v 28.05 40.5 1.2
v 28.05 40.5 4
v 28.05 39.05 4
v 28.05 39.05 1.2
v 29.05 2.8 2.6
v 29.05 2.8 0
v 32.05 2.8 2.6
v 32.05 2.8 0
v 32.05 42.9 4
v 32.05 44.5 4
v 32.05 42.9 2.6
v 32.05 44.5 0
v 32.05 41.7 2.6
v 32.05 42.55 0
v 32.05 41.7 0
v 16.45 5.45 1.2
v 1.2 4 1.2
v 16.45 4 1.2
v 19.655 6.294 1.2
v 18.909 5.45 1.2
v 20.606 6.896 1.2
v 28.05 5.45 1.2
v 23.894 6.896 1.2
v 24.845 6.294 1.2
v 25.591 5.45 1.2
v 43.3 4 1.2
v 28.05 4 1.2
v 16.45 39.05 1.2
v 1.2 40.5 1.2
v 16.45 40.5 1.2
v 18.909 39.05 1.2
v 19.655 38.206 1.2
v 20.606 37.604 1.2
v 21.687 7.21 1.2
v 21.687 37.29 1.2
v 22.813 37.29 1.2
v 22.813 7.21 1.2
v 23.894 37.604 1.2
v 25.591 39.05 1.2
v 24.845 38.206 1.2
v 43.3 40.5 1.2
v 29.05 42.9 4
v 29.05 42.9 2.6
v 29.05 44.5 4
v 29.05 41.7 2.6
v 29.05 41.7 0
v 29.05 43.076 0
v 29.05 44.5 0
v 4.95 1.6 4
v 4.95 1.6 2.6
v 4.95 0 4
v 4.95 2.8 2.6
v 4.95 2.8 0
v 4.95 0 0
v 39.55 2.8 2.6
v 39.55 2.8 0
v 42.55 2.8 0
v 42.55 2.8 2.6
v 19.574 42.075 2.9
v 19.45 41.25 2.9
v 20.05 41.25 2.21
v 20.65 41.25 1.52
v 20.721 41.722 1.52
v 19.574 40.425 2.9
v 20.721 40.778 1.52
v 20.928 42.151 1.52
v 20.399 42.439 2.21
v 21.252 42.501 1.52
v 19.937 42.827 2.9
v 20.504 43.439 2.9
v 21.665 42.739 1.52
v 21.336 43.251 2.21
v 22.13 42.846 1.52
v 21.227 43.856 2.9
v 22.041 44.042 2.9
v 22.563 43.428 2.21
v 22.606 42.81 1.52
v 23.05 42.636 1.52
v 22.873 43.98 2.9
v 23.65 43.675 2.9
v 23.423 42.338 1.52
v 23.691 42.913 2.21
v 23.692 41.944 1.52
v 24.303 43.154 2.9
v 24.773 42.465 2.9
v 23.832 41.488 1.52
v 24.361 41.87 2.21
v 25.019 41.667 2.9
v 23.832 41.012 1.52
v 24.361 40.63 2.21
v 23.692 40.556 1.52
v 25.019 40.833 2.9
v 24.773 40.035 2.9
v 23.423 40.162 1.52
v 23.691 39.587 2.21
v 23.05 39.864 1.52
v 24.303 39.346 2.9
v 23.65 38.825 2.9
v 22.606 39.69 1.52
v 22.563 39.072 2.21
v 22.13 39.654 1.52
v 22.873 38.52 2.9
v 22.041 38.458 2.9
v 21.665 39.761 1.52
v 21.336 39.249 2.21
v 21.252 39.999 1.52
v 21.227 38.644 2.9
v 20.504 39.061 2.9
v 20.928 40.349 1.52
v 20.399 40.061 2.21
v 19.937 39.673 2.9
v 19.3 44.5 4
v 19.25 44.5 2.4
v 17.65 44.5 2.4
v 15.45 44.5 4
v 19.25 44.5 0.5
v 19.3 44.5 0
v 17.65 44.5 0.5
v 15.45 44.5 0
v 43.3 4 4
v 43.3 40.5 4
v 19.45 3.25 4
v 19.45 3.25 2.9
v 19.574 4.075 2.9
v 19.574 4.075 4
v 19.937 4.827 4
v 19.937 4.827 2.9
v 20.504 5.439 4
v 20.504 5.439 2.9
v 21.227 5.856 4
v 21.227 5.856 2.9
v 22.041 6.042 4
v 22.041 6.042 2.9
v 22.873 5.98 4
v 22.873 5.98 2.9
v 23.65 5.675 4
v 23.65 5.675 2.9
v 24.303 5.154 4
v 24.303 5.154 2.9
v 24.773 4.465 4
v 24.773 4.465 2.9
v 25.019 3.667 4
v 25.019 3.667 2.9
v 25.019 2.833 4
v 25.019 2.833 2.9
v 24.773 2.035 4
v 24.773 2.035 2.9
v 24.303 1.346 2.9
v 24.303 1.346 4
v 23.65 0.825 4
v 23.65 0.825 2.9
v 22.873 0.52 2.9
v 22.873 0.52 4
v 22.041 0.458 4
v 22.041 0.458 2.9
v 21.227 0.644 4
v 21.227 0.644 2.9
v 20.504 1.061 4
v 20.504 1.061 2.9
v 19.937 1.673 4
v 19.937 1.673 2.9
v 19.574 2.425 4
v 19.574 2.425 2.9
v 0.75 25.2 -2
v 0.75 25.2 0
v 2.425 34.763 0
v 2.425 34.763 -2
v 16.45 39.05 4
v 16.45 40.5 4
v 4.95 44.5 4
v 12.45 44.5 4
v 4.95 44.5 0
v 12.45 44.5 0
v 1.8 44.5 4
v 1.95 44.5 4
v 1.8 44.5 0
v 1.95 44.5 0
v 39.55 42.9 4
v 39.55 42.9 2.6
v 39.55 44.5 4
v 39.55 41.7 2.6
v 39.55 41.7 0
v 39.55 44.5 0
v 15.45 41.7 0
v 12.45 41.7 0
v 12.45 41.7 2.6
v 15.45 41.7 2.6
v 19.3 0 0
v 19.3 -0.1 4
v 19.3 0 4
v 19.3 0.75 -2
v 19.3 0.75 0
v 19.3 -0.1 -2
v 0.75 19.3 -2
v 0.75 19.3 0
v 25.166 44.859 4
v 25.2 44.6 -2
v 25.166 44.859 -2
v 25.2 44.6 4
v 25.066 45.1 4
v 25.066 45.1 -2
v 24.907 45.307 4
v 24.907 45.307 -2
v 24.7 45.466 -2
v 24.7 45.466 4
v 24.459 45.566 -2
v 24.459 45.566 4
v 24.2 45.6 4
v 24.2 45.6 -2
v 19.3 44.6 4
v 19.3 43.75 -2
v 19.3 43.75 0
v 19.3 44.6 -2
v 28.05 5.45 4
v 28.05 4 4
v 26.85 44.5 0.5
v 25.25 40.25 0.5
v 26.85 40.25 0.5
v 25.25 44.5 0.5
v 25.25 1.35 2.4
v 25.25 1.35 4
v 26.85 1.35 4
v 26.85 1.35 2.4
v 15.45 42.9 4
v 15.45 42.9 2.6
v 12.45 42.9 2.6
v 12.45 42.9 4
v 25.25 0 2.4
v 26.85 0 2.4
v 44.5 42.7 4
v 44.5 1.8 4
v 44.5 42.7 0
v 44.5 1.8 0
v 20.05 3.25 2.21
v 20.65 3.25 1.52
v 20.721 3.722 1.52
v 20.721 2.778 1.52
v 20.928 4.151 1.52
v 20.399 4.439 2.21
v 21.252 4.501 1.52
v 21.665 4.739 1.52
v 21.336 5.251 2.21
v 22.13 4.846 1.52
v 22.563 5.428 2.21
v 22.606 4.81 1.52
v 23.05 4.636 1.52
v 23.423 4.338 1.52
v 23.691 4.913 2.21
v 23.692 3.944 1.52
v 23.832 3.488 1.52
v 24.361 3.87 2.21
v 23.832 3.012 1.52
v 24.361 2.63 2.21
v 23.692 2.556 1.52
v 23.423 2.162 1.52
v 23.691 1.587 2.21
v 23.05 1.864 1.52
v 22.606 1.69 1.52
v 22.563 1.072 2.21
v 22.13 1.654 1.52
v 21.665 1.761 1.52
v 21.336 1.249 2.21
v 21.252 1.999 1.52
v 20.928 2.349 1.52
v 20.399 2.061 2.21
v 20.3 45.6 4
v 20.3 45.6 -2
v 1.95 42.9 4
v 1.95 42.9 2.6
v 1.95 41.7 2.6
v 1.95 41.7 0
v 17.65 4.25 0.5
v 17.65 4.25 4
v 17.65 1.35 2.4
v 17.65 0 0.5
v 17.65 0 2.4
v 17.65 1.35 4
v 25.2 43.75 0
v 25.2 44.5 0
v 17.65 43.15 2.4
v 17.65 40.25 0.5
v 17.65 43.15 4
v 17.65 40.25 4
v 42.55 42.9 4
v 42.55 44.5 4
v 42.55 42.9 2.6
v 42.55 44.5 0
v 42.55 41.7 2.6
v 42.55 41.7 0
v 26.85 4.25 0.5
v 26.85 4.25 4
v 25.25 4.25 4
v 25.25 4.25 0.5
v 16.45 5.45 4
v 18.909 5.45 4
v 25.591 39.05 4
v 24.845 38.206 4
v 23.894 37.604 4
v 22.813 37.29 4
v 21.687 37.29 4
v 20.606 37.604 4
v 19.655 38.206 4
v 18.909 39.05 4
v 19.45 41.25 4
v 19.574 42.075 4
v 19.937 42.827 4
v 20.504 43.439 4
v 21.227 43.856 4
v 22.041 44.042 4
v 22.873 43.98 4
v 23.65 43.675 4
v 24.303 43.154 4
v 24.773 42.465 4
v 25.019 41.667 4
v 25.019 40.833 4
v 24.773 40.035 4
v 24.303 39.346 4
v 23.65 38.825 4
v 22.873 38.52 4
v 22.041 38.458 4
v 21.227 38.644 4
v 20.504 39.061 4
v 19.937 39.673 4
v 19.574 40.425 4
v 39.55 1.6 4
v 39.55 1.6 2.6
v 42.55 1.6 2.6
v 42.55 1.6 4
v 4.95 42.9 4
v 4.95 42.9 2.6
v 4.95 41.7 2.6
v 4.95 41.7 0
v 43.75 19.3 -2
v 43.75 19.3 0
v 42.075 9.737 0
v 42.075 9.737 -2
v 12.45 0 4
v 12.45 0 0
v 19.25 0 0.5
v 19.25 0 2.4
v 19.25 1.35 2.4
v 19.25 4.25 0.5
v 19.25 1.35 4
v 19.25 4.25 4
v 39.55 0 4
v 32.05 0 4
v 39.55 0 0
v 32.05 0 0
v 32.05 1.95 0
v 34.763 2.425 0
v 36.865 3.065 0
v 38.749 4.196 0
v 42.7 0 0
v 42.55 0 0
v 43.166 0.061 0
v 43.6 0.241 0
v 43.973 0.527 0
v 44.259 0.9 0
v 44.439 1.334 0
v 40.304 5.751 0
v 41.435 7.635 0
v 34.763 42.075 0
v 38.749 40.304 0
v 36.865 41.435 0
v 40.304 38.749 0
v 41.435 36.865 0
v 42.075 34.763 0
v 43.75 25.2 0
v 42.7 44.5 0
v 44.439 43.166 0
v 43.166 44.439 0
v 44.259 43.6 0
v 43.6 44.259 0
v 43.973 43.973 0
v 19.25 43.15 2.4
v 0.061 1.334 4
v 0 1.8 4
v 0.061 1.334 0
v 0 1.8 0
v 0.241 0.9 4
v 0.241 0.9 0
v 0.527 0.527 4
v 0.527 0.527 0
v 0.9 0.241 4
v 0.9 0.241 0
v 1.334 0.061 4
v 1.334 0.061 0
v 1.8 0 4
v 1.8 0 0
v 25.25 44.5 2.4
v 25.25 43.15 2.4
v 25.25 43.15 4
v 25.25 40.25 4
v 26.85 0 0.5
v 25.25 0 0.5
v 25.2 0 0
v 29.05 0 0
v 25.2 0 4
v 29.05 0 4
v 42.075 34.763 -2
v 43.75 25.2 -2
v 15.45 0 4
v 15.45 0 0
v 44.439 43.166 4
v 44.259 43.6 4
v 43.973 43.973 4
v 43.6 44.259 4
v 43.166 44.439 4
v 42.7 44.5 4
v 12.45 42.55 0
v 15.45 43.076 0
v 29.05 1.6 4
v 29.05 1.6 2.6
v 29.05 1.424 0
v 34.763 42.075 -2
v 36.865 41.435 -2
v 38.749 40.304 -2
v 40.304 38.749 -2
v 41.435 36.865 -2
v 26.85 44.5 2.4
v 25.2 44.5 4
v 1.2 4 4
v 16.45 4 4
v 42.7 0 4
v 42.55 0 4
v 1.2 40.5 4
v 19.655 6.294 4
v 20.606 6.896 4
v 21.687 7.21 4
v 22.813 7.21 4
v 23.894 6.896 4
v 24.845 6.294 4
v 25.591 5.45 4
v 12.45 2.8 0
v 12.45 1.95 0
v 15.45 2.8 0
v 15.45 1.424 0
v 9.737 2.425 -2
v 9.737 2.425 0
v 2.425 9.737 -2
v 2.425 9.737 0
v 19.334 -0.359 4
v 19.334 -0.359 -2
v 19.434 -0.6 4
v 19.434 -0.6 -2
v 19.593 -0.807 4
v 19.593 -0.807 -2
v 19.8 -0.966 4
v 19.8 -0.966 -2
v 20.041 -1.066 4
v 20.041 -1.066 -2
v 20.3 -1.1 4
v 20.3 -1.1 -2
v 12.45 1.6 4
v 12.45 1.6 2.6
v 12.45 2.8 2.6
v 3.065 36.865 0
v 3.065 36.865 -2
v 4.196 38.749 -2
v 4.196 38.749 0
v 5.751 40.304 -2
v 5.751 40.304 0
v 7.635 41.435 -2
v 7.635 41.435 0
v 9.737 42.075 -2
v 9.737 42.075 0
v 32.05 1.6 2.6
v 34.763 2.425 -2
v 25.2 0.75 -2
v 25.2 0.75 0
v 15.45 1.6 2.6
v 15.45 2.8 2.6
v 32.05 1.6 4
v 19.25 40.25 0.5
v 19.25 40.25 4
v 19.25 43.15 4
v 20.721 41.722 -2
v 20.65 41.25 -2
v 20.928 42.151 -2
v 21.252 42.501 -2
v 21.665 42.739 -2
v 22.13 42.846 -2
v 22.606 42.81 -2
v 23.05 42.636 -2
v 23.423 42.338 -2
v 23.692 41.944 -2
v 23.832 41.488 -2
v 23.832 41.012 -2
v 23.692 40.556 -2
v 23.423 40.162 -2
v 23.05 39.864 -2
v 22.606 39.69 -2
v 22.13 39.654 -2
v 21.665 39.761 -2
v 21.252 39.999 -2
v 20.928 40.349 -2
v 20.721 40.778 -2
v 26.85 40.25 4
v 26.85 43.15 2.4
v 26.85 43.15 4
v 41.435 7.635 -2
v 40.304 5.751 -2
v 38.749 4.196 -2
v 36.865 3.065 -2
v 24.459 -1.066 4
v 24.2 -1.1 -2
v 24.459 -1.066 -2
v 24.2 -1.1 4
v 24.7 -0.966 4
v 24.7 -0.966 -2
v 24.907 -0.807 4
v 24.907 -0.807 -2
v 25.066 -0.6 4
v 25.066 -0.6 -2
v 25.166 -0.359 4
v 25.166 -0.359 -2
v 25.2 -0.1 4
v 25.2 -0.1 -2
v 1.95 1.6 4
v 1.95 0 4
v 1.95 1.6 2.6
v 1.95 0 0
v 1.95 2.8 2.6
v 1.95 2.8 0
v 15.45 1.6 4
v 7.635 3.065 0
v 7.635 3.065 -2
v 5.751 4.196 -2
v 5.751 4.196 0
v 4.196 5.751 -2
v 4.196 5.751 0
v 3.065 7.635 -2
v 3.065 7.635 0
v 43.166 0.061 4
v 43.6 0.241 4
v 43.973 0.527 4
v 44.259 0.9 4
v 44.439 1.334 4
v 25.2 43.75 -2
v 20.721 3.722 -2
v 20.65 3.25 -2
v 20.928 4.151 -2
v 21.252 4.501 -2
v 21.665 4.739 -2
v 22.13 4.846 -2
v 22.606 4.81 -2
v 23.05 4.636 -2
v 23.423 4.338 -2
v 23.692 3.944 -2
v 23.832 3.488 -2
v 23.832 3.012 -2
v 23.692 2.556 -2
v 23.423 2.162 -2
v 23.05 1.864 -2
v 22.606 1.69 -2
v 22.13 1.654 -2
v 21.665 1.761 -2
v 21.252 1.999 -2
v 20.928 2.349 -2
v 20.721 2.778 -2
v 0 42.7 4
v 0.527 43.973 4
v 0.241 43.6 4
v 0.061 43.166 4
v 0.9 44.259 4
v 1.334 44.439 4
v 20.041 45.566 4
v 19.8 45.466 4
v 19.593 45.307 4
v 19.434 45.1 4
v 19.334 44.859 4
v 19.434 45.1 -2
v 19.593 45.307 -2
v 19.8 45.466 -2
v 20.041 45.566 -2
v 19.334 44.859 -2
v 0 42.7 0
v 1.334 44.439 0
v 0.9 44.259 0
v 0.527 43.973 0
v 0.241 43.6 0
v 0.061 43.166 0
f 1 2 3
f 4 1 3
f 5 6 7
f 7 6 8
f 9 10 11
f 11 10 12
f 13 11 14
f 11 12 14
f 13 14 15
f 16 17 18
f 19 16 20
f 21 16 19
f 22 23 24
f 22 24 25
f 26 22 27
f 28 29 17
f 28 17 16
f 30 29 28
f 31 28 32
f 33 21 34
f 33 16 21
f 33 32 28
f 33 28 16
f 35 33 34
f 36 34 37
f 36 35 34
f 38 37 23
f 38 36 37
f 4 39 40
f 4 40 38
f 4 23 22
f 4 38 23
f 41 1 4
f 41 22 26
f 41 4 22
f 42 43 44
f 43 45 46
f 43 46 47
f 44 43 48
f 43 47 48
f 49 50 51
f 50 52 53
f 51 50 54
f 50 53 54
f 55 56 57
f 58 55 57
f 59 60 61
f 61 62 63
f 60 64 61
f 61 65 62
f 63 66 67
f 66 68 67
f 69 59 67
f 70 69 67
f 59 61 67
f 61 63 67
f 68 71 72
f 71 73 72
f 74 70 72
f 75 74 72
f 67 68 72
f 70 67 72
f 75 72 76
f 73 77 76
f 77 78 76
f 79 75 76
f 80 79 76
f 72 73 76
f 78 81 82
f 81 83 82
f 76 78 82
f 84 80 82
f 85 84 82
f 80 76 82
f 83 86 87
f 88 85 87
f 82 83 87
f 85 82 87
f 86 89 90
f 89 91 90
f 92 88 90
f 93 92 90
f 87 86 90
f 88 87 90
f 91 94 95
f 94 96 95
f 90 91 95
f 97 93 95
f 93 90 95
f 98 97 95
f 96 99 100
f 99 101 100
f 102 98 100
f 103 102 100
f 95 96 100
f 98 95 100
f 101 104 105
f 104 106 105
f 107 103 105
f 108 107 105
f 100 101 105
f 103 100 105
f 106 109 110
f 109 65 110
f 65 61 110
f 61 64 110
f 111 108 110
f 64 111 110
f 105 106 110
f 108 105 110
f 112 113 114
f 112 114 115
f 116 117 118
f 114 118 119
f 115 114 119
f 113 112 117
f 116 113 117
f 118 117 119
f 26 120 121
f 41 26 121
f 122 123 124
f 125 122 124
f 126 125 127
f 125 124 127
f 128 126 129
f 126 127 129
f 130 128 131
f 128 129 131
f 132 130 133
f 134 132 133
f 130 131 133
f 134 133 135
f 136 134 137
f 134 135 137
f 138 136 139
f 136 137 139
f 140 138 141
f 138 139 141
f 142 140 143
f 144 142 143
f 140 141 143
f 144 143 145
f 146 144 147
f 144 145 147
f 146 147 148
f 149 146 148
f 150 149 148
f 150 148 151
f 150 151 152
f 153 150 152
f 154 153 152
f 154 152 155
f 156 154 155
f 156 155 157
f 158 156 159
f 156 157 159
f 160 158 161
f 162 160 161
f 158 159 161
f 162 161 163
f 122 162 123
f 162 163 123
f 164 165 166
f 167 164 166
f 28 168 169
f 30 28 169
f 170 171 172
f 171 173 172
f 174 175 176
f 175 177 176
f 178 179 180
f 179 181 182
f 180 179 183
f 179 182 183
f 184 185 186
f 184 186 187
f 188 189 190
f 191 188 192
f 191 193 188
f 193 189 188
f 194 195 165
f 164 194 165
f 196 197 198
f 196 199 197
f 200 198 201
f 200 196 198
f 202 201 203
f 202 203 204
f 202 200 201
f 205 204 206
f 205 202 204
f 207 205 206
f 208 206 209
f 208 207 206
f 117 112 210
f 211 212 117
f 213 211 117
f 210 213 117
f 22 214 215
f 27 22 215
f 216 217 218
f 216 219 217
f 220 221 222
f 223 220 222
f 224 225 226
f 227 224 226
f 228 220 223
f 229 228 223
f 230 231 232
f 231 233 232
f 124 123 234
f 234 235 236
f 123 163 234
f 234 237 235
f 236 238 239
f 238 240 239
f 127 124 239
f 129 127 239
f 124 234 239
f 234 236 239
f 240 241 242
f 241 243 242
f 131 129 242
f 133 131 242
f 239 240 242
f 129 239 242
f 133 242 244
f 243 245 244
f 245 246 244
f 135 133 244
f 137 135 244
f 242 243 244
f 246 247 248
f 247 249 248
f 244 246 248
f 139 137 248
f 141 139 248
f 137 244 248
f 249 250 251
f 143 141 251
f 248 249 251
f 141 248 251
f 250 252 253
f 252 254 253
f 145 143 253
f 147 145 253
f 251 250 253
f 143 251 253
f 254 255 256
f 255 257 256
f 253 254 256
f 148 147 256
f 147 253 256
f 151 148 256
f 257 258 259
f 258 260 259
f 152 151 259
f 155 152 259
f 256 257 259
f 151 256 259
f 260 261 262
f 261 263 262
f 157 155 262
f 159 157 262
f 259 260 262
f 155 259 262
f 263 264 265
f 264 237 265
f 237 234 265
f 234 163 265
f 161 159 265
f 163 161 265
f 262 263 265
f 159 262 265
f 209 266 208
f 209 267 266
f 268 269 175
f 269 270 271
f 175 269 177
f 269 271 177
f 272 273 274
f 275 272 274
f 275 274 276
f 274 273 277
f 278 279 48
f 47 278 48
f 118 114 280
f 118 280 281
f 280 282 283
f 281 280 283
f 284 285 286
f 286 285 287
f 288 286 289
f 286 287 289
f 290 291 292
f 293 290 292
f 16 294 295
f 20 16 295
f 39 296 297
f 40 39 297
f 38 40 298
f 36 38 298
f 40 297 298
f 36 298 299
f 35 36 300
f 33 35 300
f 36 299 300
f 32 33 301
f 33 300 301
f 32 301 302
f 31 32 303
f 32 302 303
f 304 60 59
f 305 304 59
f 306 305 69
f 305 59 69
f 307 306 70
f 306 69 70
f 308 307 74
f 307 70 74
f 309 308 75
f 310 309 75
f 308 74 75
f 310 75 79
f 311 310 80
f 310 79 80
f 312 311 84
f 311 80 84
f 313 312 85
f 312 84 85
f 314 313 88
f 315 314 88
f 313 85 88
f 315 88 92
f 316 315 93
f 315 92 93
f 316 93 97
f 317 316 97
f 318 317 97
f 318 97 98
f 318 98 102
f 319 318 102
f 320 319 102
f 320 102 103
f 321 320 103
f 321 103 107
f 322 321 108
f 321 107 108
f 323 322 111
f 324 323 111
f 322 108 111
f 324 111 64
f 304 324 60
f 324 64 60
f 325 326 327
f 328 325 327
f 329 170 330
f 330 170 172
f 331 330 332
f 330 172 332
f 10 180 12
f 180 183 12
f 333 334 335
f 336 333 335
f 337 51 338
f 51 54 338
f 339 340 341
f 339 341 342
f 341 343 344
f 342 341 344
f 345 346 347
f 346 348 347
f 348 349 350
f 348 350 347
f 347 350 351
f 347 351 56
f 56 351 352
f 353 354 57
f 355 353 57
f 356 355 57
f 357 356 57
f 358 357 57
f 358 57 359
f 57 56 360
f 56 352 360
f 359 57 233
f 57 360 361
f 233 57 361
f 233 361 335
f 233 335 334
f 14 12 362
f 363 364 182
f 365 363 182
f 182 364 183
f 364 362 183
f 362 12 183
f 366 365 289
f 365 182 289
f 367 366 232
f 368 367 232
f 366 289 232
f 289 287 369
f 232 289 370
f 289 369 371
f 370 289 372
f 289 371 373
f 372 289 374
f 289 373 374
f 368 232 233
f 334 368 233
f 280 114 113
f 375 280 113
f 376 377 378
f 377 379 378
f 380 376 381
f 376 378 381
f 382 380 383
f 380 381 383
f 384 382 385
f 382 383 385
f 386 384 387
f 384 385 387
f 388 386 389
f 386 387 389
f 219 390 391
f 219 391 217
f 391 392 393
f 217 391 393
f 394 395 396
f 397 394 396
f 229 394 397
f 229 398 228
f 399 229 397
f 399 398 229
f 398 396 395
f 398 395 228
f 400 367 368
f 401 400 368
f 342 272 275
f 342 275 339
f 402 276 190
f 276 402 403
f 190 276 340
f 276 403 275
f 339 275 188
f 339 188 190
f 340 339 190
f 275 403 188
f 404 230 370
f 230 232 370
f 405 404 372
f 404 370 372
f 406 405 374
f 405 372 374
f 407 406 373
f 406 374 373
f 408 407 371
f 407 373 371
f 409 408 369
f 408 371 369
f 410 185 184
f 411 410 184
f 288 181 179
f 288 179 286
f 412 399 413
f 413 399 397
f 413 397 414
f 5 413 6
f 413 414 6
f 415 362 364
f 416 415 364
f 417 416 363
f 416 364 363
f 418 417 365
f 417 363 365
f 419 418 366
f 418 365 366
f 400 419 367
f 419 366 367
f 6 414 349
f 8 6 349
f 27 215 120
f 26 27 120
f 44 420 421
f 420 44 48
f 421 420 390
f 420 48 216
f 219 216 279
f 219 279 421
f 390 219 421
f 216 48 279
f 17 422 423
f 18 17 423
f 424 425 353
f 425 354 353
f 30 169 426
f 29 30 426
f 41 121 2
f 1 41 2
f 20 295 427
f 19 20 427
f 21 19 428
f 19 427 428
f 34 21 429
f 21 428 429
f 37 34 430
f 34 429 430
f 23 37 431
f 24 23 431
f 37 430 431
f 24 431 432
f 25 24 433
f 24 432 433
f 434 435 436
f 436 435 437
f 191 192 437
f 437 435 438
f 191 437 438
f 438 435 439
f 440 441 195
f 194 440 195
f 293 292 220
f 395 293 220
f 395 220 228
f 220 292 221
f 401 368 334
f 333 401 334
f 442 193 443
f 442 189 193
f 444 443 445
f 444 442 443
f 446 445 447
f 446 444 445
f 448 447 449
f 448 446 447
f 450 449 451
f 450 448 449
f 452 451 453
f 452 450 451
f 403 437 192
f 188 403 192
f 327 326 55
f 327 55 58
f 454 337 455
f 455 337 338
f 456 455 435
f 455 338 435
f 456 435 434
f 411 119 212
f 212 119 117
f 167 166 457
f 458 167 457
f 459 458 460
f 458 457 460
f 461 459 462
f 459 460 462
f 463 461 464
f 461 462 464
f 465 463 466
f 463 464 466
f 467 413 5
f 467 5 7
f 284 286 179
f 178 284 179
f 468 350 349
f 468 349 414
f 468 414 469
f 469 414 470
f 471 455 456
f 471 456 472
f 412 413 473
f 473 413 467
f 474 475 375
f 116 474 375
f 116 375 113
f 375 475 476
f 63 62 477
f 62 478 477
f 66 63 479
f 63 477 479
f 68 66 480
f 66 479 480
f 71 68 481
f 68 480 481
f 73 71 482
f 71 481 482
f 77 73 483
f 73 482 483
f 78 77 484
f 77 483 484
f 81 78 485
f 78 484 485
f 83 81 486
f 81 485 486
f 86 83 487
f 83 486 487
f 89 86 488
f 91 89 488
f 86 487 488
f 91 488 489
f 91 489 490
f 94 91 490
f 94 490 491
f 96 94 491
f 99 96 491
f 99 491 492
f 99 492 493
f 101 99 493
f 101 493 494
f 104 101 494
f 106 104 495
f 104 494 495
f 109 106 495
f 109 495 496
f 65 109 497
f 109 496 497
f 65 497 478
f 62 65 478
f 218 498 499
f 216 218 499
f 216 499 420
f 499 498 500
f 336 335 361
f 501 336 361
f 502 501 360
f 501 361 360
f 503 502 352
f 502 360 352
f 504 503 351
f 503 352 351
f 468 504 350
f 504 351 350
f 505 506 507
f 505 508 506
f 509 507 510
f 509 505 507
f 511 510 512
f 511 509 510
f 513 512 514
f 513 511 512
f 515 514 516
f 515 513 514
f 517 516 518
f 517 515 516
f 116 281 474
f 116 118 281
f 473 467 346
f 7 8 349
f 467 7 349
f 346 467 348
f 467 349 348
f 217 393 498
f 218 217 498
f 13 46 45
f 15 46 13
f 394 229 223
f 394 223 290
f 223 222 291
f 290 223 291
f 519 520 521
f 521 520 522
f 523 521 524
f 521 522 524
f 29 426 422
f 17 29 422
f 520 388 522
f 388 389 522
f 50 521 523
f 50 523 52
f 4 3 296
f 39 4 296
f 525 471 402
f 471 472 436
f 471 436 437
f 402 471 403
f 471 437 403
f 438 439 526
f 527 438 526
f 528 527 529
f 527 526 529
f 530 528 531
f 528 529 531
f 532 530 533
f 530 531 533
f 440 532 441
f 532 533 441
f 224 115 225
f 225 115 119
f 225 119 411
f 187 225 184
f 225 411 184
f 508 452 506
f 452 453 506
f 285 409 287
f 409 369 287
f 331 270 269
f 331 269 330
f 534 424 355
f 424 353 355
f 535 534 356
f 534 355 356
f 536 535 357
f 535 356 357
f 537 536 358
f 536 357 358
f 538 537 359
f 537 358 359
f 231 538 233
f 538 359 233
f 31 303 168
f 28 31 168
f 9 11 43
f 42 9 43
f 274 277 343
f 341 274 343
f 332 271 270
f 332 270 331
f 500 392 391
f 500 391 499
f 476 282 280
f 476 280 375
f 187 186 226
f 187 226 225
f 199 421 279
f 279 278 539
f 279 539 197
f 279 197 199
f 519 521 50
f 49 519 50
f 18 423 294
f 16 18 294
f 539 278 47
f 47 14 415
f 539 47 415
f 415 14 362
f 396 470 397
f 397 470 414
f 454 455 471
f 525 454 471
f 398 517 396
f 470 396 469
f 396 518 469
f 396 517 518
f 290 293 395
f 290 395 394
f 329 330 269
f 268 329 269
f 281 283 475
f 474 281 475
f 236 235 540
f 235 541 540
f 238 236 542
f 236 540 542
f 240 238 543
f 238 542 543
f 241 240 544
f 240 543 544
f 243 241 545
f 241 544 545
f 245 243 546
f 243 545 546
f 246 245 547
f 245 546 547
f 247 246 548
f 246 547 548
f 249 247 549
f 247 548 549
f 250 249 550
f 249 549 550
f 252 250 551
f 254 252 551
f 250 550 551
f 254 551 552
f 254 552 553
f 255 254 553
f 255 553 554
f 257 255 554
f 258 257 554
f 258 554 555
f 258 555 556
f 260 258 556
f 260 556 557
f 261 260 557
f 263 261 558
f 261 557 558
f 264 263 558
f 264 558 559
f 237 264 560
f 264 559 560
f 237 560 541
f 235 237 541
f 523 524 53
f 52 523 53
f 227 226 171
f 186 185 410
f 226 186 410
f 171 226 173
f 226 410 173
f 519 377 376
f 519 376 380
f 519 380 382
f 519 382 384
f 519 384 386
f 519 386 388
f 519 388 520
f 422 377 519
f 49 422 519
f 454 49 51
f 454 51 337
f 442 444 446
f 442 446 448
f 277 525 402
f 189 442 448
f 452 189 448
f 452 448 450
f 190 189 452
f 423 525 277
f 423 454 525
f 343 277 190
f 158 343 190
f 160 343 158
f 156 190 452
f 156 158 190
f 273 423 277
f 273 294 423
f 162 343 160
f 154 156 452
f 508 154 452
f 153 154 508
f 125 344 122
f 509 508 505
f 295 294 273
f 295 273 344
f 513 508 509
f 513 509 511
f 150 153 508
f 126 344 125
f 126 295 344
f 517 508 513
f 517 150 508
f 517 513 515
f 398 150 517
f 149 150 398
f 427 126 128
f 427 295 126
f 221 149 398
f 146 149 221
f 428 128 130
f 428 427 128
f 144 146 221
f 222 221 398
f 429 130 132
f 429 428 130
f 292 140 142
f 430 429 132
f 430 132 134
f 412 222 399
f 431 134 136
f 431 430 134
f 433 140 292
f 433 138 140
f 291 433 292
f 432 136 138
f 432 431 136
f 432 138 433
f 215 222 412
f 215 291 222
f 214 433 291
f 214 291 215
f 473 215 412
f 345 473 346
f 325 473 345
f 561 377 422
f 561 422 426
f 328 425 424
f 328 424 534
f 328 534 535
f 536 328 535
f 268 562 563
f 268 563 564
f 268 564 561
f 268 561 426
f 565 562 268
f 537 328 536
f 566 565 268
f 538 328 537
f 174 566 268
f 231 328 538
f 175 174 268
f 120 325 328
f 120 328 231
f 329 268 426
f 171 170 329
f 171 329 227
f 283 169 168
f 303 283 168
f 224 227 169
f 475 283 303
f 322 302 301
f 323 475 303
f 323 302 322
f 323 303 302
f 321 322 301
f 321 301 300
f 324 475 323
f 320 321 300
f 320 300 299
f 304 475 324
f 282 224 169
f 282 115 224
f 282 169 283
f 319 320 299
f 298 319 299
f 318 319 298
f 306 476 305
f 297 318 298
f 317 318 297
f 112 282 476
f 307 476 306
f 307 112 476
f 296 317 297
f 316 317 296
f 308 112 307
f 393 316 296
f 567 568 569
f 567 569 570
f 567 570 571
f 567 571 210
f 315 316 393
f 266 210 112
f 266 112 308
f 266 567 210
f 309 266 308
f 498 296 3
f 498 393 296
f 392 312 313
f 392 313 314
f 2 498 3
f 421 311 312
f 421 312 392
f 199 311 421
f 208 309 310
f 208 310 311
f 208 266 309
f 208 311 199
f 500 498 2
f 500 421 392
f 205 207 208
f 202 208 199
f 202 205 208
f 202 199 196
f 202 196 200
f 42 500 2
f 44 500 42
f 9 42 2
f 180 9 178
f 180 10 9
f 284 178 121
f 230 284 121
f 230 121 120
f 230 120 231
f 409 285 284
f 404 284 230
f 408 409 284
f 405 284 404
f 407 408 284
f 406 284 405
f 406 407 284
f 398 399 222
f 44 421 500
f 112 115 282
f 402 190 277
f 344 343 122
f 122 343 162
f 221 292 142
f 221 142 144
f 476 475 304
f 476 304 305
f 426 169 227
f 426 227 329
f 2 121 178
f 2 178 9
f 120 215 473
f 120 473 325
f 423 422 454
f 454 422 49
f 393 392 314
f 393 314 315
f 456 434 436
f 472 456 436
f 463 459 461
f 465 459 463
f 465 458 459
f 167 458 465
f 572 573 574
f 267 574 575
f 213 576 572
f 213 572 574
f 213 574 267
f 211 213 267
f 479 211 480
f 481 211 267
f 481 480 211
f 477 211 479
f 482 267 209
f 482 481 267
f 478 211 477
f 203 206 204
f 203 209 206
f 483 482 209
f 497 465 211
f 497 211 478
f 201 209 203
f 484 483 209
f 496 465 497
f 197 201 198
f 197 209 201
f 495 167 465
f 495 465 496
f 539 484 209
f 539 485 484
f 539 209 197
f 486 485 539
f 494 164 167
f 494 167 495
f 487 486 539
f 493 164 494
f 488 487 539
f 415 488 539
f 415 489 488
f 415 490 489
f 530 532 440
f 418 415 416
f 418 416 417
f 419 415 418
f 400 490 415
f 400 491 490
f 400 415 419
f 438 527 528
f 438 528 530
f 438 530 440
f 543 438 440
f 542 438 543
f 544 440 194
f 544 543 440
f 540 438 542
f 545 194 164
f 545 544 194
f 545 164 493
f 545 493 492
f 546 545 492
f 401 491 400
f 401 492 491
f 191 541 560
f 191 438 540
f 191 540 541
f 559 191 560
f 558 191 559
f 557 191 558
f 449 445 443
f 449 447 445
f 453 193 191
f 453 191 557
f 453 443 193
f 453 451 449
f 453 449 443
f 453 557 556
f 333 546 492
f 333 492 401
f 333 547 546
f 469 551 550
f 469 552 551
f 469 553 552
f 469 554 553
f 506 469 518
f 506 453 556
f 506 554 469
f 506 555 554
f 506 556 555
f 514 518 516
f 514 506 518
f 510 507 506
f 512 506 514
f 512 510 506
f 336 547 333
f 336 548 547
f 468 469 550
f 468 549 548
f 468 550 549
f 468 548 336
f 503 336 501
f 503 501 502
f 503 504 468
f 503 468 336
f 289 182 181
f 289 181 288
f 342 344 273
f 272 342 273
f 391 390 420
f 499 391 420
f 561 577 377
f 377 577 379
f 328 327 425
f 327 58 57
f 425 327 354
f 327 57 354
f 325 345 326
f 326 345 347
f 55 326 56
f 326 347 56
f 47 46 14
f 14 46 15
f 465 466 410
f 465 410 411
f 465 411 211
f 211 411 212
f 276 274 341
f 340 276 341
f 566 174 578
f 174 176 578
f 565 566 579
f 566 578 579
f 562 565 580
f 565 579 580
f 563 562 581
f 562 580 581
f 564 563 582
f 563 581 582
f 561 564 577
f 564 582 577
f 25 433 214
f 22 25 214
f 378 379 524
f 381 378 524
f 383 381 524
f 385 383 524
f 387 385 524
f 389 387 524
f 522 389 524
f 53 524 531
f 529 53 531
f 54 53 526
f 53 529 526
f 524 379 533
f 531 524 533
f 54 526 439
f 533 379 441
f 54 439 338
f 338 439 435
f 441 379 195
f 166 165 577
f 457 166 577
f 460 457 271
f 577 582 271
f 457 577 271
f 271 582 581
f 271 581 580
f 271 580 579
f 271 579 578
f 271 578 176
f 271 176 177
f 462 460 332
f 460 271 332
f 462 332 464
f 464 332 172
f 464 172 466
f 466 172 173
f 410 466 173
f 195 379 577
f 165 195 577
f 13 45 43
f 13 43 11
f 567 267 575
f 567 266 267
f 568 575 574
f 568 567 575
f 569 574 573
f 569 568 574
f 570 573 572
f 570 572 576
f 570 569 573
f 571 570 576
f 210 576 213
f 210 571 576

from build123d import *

# Parameters (mm, degrees)
F0_W           = 5.9
F0_H           = 1.1
F1_DEPTH       = 2.9
F2_W           = 5.9
F2_H           = 1.85
F3_DEPTH       = 2
F5_D           = 3.2
F5_CSINK_D     = 5.6
F5_CSINK_ANGLE = 82
F6_DEPTH       = 1.1
F7_R           = 1
F8_W           = 3
F8_H           = 1.2
F9_DEPTH       = 2.6
F10_W          = 1.6
F10_H          = 2.7
F10_H_2        = 1.55
F11_DEPTH      = 3.5
F12_W          = 1.6
F12_H          = 1.35
F13_DEPTH      = 1.6
F15_DEPTH      = 2.8


with BuildPart() as f1:
    # F0 (on Top) → F1 (new body)
    with BuildSketch(Plane.XY):
        with BuildLine():
            Line((4.95, 1.6), (4.95, 0))
            Line((4.95, 0), (12.45, 0))
            Line((12.45, 0), (12.45, 1.6))
            Line((12.45, 1.6), (15.45, 1.6))
            Line((15.45, 1.6), (15.45, 0))
            Line((15.45, 0), (19.3, 0))
            Line((19.3, 0), (19.3, 1.1))
            Line((19.3, 1.1), (25.2, 1.1))
            Line((25.2, 1.1), (25.2, 0))
            Line((25.2, 0), (29.05, 0))
            Line((29.05, 0), (29.05, 1.6))
            Line((29.05, 1.6), (32.05, 1.6))
            Line((32.05, 1.6), (32.05, 0))
            Line((32.05, 0), (39.55, 0))
            Line((39.55, 0), (39.55, 1.6))
            Line((39.55, 1.6), (42.55, 1.6))
            Line((42.55, 1.6), (42.55, 0))
            Line((42.55, 0), (42.7, 0))
            ThreePointArc((42.7, 0), (43.9727922061, 0.5272077939), (44.5, 1.8))
            Line((44.5, 1.8), (44.5, 42.7))
            ThreePointArc((44.5, 42.7), (43.9727922061, 43.9727922061), (42.7, 44.5))
            Line((42.7, 44.5), (42.55, 44.5))
            Line((42.55, 44.5), (42.55, 42.9))
            Line((42.55, 42.9), (39.55, 42.9))
            Line((39.55, 42.9), (39.55, 44.5))
            Line((39.55, 44.5), (32.05, 44.5))
            Line((32.05, 44.5), (32.05, 42.9))
            Line((32.05, 42.9), (29.05, 42.9))
            Line((29.05, 42.9), (29.05, 44.5))
            Line((29.05, 44.5), (25.2, 44.5))
            Line((25.2, 44.5), (25.2, 43.4))
            Line((25.2, 43.4), (19.3, 43.4))
            Line((19.3, 43.4), (19.3, 44.5))
            Line((19.3, 44.5), (15.45, 44.5))
            Line((15.45, 44.5), (15.45, 42.9))
            Line((15.45, 42.9), (12.45, 42.9))
            Line((12.45, 42.9), (12.45, 44.5))
            Line((12.45, 44.5), (4.95, 44.5))
            Line((4.95, 44.5), (4.95, 42.9))
            Line((4.95, 42.9), (1.95, 42.9))
            Line((1.95, 42.9), (1.95, 44.5))
            Line((1.95, 44.5), (1.8, 44.5))
            ThreePointArc((1.8, 44.5), (0.5272077939, 43.9727922061), (0, 42.7))
            Line((0, 42.7), (0, 1.8))
            ThreePointArc((0, 1.8), (0.5272077939, 0.5272077939), (1.8, 0))
            Line((1.8, 0), (1.95, 0))
            Line((1.95, 0), (1.95, 1.6))
            Line((1.95, 1.6), (4.95, 1.6))
        make_face()
        with Locations((22.25, -0.55)):
            Rectangle(F0_W, F0_H)
        with Locations((22.25, 0.55)):
            Rectangle(F0_W, F0_H)
        with Locations((22.25, 43.95)):
            Rectangle(F0_W, F0_H)
        with Locations((22.25, 45.05)):
            Rectangle(F0_W, F0_H)
    extrude(amount=F1_DEPTH)

    # F2 (on face) → F3 (join)
    with BuildSketch(Plane(origin=(0, 0, 0), x_dir=(1, 0, 0), z_dir=(0, 0, -1))):
        with Locations((22.25, 0.175)):
            Rectangle(F2_W, F2_H)
        with BuildLine():
            Line((25.2, -0.75), (19.3, -0.75))
            Line((19.3, -0.75), (9.7372574326, -2.4247745488))
            ThreePointArc((9.7372574326, -2.4247745488), (4.9258838609, -4.9258838609), (2.4247745488, -9.7372574326))
            Line((2.4247745488, -9.7372574326), (0.75, -19.3))
            Line((0.75, -19.3), (0.75, -25.2))
            Line((0.75, -25.2), (2.4247745488, -34.7627425674))
            ThreePointArc((2.4247745488, -34.7627425674), (4.9258838609, -39.5741161391), (9.7372574326, -42.0752254512))
            Line((9.7372574326, -42.0752254512), (19.3, -43.75))
            Line((19.3, -43.75), (25.2, -43.75))
            Line((25.2, -43.75), (34.7627425674, -42.0752254512))
            ThreePointArc((34.7627425674, -42.0752254512), (39.5741161391, -39.5741161391), (42.0752254512, -34.7627425674))
            Line((42.0752254512, -34.7627425674), (43.75, -25.2))
            Line((43.75, -25.2), (43.75, -19.3))
            Line((43.75, -19.3), (42.0752254512, -9.7372574326))
            ThreePointArc((42.0752254512, -9.7372574326), (39.5741161391, -4.9258838609), (34.7627425674, -2.4247745488))
            Line((34.7627425674, -2.4247745488), (25.2, -0.75))
        make_face()
        with Locations((22.25, -44.675)):
            Rectangle(F2_W, F2_H)
    extrude(amount=F3_DEPTH)

    # F5 (through all)
    with Locations(Plane.XY.offset(2.9)):
        with Locations((22.25, 41.25), (22.25, 3.25)):
            CounterSinkHole(F5_D / 2, F5_CSINK_D / 2, counter_sink_angle=F5_CSINK_ANGLE)

    # F6 (add): a face of the model
    f6_faces = [f1.faces().sort_by_distance(p)[0] for p in [
        (22.25, 22.25, 2.9),
    ]]
    extrude(f6_faces, amount=F6_DEPTH)

    # F7
    f7_edges = [f1.edges().sort_by_distance(p)[0] for p in [
        (25.2, -1.1, 1),
        (19.3, -1.1, 1),
        (25.2, 45.6, 1),
        (19.3, 45.6, 1),
    ]]
    fillet(f7_edges, radius=F7_R)

    # F8 (on face) → F9 (cut, through all)
    with BuildSketch(Plane(origin=(0, 0, 0), x_dir=(1, 0, 0), z_dir=(0, 0, -1))):
        with Locations((3.45, -42.3)):
            Rectangle(F8_W, F8_H)
        with Locations((13.95, -42.3)):
            Rectangle(F8_W, F8_H)
        with Locations((3.45, -2.2)):
            Rectangle(F8_W, F8_H)
        with Locations((13.95, -2.2)):
            Rectangle(F8_W, F8_H)
        with Locations((30.55, -42.3)):
            Rectangle(F8_W, F8_H)
        with Locations((41.05, -42.3)):
            Rectangle(F8_W, F8_H)
        with Locations((30.55, -2.2)):
            Rectangle(F8_W, F8_H)
        with Locations((41.05, -2.2)):
            Rectangle(F8_W, F8_H)
    extrude(amount=-F9_DEPTH, mode=Mode.SUBTRACT)

    # F10 (on face) → F11 (cut)
    with BuildSketch(Plane.XY.offset(4)):
        Polygon((19.25, 1.55), (19.25, 4.25), (17.65, 4.25), (17.65, 1.55), (17.65, 0), (19.25, 0), align=None)
        with Locations((18.45, 41.6)):
            Rectangle(F10_W, F10_H)
        with Locations((18.45, 43.725)):
            Rectangle(F10_W, F10_H_2)
        Polygon((25.25, 4.25), (25.25, 1.55), (25.25, 0), (26.85, 0), (26.85, 1.55), (26.85, 4.25), align=None)
        Polygon((25.25, 42.95), (25.25, 40.25), (26.85, 40.25), (26.85, 42.95), (26.85, 44.5), (25.25, 44.5), align=None)
    extrude(amount=-F11_DEPTH, mode=Mode.SUBTRACT)

    # F12 (on face) → F13 (join)
    with BuildSketch(Plane.XY.offset(4)):
        with Locations((26.05, 0.675)):
            Rectangle(F12_W, F12_H)
        with Locations((18.45, 0.675)):
            Rectangle(F12_W, F12_H)
        with Locations((26.05, 43.825)):
            Rectangle(F12_W, F12_H)
        with Locations((18.45, 43.825)):
            Rectangle(F12_W, F12_H)
    extrude(amount=-F13_DEPTH)

    # F14 (on face) → F15 (cut, through all)
    with BuildSketch(Plane.XY.offset(4)):
        with BuildLine():
            Line((16.45, 40.5), (1.2, 40.5))
            Line((1.2, 40.5), (1.2, 22.25))
            Line((1.2, 22.25), (1.2, 4))
            Line((1.2, 4), (16.45, 4))
            Line((16.45, 4), (16.45, 5.45))
            Line((16.45, 5.45), (18.9093410611, 5.45))
            ThreePointArc((18.9093410611, 5.45), (22.25, 7.2500002682), (25.5906589389, 5.45))
            Line((25.5906589389, 5.45), (28.05, 5.45))
            Line((28.05, 5.45), (28.05, 4))
            Line((28.05, 4), (43.3, 4))
            Line((43.3, 4), (43.3, 22.25))
            Line((43.3, 22.25), (43.3, 40.5))
            Line((43.3, 40.5), (28.05, 40.5))
            Line((28.05, 40.5), (28.05, 39.05))
            Line((28.05, 39.05), (25.5906589389, 39.05))
            ThreePointArc((25.5906589389, 39.05), (22.25, 37.2499997318), (18.9093410611, 39.05))
            Line((18.9093410611, 39.05), (16.45, 39.05))
            Line((16.45, 39.05), (16.45, 40.5))
        make_face()
    extrude(amount=-F15_DEPTH, mode=Mode.SUBTRACT)


solid = f1.part
